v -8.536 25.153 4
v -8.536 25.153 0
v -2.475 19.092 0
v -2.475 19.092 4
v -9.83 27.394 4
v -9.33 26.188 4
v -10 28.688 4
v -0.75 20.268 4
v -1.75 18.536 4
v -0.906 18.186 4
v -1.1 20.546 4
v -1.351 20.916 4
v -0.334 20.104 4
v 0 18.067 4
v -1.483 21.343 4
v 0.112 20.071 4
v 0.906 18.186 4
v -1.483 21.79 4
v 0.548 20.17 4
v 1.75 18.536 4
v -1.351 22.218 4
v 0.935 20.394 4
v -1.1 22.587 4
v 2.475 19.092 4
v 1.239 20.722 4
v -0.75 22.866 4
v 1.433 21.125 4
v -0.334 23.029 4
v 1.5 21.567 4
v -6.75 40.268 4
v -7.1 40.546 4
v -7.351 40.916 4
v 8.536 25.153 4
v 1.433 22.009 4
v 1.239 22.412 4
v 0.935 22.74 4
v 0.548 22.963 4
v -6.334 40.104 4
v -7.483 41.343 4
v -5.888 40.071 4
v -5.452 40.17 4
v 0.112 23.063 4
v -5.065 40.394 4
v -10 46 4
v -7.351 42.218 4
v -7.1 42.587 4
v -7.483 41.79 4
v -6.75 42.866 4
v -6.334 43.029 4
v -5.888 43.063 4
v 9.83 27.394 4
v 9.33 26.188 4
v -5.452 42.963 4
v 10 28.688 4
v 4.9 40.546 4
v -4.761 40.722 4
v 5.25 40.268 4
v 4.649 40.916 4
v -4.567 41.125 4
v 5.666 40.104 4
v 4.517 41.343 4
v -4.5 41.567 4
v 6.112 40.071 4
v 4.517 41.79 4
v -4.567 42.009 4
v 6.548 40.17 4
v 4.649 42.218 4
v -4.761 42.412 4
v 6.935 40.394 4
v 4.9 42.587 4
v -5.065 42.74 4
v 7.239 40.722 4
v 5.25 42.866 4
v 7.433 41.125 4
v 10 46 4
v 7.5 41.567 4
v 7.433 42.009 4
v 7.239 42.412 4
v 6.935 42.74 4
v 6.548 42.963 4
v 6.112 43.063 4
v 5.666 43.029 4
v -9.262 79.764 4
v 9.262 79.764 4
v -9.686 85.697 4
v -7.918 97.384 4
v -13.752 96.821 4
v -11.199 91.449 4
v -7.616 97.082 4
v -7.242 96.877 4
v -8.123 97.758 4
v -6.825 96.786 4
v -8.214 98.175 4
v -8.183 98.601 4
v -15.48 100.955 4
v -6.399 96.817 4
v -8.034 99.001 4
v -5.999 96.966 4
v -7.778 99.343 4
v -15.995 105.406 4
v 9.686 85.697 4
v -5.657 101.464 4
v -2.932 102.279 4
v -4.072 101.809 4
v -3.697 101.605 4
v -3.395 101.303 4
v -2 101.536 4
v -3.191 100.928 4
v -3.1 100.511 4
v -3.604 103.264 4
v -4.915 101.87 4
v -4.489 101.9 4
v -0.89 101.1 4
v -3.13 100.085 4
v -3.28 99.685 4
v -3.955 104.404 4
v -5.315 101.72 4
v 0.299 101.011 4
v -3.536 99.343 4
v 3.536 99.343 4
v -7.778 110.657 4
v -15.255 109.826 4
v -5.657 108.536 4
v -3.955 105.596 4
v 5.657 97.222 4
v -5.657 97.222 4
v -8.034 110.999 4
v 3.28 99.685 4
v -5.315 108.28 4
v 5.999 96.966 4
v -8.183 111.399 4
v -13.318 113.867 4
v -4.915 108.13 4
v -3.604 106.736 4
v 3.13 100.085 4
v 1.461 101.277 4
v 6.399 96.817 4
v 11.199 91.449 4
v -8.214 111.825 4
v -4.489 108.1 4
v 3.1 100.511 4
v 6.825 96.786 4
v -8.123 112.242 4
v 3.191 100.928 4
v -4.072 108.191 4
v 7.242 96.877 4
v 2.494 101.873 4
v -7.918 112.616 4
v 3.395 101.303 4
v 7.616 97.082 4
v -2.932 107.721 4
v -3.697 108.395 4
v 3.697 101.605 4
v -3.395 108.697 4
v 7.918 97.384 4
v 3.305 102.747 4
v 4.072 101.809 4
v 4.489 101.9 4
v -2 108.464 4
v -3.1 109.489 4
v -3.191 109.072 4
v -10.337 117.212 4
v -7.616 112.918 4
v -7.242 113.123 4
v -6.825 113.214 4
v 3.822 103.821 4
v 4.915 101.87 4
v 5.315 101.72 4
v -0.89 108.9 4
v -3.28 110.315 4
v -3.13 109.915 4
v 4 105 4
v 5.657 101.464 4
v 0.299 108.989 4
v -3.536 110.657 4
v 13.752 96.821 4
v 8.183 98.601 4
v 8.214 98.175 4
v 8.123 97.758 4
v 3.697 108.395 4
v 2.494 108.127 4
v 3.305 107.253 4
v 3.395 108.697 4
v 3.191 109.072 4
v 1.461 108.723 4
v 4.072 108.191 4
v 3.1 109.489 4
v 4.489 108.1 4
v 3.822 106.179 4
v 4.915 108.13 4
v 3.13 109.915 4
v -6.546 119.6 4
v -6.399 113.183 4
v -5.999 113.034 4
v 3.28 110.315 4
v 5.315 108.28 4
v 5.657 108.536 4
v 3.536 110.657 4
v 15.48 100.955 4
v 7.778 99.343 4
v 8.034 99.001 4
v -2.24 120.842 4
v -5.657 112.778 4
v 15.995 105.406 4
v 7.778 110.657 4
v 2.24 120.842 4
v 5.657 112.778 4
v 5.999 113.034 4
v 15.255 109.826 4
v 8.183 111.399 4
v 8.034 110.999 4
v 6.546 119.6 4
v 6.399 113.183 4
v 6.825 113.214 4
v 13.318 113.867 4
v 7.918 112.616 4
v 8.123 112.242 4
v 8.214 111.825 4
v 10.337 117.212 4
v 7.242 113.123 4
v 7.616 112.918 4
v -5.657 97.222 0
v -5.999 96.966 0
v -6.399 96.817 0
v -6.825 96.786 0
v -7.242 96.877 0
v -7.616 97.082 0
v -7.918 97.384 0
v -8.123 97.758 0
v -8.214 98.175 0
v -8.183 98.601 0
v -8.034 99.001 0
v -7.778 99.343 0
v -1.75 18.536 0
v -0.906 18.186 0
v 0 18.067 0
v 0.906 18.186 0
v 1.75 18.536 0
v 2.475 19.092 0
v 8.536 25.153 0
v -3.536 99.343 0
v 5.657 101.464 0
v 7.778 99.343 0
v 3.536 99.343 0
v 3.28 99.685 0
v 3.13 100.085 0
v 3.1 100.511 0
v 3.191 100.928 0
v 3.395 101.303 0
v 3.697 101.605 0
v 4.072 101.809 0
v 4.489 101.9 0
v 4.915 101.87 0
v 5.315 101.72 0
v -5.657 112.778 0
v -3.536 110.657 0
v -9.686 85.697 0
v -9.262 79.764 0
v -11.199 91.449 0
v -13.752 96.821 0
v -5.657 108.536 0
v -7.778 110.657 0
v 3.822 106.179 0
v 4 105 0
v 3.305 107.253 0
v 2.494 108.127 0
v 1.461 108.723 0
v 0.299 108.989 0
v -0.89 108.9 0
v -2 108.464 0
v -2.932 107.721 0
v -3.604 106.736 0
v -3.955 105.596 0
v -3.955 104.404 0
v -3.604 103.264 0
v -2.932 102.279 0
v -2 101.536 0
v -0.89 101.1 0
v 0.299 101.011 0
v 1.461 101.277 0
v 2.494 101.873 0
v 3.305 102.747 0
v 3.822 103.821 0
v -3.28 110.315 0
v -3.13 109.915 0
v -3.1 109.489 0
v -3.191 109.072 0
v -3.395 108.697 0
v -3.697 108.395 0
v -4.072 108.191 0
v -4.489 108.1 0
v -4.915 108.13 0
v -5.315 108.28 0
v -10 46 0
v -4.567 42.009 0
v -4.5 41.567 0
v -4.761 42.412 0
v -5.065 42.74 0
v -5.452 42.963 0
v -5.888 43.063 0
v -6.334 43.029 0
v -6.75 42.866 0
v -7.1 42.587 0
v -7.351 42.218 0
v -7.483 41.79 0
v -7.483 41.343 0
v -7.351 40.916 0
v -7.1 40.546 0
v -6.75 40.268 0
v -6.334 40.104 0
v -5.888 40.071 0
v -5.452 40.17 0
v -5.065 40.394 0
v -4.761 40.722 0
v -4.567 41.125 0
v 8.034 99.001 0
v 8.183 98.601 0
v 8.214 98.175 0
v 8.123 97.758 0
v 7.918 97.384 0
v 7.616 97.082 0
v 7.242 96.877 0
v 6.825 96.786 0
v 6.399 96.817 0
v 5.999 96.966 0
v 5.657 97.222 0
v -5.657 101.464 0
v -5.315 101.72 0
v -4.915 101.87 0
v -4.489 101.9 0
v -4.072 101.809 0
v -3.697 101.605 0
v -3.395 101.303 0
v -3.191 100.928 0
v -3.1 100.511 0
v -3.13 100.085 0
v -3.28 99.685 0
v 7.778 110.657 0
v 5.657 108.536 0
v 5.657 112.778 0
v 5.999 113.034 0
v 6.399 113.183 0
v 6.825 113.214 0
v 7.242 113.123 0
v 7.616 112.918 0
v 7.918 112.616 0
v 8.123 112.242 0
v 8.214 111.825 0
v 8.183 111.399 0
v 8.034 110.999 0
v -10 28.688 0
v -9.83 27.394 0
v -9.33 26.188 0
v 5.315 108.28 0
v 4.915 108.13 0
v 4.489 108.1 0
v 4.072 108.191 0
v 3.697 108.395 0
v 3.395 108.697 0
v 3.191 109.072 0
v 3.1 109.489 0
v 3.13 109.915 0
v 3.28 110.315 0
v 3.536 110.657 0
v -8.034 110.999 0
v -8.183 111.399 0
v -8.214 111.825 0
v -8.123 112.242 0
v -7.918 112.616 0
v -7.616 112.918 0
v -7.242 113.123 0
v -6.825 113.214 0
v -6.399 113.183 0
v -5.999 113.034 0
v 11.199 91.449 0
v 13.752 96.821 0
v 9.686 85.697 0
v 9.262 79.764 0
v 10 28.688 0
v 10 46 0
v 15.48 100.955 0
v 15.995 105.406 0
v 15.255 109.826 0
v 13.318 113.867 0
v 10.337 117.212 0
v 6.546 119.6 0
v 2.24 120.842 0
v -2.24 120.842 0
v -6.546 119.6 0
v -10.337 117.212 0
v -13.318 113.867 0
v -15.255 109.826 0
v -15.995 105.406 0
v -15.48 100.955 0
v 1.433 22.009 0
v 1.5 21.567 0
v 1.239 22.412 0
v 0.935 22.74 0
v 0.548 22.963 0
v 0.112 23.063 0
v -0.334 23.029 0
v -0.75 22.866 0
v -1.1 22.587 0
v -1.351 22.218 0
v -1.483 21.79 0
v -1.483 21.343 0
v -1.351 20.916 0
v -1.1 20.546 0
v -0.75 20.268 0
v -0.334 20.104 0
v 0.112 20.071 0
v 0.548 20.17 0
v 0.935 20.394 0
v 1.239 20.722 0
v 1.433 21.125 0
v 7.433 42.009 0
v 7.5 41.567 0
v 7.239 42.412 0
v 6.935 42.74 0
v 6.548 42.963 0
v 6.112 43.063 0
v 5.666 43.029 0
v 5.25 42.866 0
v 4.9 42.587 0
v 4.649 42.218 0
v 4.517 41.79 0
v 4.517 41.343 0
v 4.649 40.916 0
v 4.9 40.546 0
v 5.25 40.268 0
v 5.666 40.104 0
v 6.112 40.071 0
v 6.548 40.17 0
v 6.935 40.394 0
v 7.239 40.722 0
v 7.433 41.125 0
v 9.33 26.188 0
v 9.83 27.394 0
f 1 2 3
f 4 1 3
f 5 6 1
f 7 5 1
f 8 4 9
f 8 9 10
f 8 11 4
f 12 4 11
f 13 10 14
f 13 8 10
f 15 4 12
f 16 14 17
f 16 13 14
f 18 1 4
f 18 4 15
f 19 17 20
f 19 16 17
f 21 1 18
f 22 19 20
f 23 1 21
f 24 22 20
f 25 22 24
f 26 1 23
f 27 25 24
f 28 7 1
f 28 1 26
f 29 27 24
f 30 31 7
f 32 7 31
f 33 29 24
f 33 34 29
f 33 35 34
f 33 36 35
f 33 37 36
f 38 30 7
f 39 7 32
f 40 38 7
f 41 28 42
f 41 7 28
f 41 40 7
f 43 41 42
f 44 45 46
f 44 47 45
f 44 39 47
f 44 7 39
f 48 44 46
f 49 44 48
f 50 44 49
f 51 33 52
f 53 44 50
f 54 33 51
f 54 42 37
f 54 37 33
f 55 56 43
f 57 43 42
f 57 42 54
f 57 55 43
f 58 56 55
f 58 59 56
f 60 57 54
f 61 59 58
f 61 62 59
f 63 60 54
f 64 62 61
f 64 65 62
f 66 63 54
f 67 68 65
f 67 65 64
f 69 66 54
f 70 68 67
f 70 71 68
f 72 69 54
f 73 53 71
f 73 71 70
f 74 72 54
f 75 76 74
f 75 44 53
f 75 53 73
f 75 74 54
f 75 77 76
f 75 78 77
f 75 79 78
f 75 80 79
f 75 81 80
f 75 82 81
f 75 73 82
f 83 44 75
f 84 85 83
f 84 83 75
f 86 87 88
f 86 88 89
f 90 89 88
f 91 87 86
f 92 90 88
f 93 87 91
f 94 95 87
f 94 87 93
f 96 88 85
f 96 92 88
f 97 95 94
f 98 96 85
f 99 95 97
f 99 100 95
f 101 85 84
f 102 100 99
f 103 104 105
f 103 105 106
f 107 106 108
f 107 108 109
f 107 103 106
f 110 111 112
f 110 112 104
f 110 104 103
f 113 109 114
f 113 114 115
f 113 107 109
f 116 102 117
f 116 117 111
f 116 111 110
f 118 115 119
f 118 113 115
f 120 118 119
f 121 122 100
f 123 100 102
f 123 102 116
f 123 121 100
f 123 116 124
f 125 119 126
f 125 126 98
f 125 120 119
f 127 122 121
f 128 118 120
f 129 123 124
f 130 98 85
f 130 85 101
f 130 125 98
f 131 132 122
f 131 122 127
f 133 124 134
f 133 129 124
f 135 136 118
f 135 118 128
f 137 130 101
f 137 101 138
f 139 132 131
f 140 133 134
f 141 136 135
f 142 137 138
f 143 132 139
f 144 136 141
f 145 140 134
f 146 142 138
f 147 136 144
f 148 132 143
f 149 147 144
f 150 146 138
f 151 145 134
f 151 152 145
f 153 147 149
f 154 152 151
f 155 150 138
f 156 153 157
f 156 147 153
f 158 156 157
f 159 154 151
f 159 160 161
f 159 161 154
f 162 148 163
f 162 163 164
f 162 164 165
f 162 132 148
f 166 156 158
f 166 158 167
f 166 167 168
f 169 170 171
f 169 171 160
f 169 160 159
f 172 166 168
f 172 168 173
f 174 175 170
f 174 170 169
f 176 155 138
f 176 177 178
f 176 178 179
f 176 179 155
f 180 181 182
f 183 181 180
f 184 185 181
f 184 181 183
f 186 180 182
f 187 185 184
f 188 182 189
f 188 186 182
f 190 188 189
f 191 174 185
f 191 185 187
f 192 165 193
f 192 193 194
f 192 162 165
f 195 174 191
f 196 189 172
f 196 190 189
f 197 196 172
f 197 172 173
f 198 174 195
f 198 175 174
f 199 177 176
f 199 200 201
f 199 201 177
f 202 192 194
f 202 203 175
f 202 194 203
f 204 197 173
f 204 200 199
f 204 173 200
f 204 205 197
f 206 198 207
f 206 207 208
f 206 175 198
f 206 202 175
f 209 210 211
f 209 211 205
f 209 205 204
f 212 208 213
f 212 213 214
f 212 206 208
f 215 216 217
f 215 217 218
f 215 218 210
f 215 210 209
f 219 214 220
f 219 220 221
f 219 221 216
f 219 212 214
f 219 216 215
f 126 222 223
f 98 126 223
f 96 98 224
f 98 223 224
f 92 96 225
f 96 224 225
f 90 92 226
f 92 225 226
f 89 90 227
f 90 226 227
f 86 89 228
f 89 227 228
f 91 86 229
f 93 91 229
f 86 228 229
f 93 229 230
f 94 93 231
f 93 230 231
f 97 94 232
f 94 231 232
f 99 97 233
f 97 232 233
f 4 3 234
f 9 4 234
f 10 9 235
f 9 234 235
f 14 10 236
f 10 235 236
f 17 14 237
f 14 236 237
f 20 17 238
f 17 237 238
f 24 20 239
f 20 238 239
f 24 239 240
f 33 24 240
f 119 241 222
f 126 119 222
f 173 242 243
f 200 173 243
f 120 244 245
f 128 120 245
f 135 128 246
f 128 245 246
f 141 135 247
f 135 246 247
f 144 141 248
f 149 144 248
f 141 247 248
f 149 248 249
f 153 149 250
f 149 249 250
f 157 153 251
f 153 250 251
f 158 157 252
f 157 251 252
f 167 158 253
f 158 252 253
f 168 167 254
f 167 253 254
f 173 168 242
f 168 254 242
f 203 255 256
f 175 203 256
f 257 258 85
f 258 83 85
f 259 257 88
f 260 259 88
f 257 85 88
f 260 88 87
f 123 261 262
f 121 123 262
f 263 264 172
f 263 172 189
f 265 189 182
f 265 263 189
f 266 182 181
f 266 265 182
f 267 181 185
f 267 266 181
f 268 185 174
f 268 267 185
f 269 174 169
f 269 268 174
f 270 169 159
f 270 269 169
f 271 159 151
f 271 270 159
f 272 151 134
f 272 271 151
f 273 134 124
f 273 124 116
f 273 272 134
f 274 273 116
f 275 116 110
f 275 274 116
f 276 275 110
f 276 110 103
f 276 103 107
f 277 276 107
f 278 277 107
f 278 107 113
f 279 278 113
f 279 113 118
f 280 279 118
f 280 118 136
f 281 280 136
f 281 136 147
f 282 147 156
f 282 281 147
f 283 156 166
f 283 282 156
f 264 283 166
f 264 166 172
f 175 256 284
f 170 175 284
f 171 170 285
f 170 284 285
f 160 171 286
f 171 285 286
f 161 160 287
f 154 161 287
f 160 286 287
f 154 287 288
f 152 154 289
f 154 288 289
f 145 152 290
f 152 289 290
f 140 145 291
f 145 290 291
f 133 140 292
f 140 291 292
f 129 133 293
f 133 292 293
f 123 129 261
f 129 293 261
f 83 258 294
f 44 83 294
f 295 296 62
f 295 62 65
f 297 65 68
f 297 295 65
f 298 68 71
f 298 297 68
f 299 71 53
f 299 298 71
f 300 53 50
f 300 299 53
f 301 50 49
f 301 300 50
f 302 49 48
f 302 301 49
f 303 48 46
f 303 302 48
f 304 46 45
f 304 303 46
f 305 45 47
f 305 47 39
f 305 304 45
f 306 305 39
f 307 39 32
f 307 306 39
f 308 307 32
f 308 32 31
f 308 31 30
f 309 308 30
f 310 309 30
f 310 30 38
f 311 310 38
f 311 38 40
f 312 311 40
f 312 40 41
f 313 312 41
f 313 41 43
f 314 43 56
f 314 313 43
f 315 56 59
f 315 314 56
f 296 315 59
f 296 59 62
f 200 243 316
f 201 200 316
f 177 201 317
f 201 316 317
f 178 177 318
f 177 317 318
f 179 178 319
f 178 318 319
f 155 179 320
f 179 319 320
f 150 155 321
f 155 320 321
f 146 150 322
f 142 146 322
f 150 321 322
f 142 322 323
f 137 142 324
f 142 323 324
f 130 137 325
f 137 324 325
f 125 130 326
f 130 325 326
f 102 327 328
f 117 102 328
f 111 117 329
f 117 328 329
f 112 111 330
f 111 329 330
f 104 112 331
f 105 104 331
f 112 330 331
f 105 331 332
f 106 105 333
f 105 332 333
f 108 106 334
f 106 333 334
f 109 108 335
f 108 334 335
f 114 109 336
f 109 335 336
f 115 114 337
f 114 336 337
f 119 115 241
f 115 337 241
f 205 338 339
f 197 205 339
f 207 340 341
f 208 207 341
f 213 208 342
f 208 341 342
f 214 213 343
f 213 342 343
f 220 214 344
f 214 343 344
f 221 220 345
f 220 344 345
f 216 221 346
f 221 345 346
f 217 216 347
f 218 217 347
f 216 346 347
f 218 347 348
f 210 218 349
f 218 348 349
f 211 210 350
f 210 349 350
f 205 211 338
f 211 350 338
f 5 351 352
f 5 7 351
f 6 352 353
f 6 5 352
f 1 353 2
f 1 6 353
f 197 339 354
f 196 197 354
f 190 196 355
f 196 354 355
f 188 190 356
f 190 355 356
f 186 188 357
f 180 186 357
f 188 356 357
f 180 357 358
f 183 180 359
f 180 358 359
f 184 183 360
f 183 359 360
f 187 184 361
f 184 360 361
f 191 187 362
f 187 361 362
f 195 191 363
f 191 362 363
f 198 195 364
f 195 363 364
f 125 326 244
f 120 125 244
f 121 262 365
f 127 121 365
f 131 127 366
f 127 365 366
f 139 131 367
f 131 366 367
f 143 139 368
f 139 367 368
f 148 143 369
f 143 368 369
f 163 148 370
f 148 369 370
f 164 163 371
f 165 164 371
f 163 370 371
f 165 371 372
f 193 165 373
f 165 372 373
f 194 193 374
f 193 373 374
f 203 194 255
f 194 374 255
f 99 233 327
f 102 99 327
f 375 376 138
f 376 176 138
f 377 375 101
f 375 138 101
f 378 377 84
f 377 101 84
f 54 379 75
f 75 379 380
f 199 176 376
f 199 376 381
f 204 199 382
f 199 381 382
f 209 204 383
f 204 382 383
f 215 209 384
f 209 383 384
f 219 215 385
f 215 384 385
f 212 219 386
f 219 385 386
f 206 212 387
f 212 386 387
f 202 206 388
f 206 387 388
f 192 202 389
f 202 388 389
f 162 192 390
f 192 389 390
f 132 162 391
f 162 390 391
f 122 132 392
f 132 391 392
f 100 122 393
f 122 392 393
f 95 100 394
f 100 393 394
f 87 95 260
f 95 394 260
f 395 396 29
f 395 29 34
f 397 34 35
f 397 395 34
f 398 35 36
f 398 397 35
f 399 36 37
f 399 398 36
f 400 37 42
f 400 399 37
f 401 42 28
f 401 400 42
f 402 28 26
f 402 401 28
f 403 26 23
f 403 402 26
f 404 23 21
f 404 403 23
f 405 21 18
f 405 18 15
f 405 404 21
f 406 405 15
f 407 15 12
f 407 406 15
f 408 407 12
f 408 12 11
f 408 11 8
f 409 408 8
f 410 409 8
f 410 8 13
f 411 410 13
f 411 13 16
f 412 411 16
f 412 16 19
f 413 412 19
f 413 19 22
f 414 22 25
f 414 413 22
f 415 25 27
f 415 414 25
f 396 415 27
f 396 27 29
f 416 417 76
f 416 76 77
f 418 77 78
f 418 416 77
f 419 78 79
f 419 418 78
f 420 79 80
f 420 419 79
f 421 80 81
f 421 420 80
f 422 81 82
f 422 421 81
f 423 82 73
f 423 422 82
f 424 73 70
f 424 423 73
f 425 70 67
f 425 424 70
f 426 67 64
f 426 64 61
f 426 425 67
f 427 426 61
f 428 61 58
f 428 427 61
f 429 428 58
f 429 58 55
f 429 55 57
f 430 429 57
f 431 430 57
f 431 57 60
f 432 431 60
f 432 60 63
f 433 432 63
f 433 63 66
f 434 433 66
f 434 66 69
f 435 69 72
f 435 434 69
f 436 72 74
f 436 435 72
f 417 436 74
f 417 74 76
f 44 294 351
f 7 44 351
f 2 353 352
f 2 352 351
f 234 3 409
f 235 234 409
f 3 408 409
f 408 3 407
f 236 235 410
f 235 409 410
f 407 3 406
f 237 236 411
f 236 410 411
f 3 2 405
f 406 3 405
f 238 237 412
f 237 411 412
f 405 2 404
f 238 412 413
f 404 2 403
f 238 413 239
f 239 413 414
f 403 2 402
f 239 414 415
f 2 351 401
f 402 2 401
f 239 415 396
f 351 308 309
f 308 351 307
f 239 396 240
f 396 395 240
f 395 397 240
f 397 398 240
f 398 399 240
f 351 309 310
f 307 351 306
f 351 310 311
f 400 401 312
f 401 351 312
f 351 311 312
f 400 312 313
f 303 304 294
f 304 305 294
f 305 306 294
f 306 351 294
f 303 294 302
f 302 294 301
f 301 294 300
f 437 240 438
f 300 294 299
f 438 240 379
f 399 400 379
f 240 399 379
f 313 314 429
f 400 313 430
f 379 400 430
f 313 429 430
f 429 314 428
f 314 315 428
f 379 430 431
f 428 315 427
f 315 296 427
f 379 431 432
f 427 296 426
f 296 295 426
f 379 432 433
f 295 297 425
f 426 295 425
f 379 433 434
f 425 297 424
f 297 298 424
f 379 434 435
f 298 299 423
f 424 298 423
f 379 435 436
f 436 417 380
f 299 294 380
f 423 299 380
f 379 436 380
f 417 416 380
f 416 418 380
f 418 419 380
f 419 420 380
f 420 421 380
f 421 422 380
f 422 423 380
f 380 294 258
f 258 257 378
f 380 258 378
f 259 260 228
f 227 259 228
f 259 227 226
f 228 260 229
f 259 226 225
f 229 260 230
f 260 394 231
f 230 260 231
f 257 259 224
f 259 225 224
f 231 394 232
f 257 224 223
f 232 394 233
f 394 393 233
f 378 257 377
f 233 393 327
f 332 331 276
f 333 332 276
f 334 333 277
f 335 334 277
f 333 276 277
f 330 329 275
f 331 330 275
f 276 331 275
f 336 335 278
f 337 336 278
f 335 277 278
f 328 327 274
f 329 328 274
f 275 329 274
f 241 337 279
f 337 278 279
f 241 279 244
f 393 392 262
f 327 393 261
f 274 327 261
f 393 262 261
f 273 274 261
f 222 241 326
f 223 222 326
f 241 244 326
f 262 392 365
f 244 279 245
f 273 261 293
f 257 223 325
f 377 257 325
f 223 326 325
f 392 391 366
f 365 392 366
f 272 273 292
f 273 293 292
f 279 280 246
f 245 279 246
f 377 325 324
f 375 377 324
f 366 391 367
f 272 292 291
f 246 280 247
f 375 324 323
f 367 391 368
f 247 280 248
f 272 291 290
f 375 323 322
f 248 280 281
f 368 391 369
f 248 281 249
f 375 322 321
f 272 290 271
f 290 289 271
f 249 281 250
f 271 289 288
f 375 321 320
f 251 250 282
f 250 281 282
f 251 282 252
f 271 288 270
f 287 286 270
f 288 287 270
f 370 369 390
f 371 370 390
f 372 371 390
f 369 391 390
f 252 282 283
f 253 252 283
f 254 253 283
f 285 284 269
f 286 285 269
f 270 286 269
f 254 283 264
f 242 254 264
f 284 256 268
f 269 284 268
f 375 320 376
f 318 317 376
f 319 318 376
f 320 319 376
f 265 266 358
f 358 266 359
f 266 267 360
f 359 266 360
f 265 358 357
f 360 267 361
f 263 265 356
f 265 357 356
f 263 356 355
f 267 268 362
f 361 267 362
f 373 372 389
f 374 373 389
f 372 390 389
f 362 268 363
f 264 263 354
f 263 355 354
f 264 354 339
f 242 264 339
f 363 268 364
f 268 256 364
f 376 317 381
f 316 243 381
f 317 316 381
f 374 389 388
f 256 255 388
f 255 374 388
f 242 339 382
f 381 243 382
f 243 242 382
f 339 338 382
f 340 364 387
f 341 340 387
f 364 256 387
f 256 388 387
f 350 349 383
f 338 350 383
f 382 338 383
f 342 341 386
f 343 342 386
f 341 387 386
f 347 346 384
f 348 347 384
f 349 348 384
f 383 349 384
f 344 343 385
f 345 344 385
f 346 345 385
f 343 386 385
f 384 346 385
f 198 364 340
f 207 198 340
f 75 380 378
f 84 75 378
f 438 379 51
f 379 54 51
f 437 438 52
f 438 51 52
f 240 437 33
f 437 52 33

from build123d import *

# Parameters (mm, degrees)
F0_R     = 1.5
F0_R_2   = 4
F1_DEPTH = 4
F2_R     = 5
F3_R     = 32


# Not quite as in the source:
# - a feature names something its author has since deleted; it is built from what else it names


with BuildPart() as f1:
    # F0 (on Top) → F1 (new body)
    with BuildSketch(Plane.XY):
        with BuildLine():
            Line((-9, 91.7712434447), (-10, 46))
            Line((-10, 46), (-10, 26.6170093579))
            Line((-10, 26.6170093579), (-2.4748737342, 19.091883092))
            ThreePointArc((-2.4748737342, 19.091883092), (0, 18.0667568262), (2.4748737342, 19.091883092))
            Line((2.4748737342, 19.091883092), (10, 26.6170093579))
            Line((10, 26.6170093579), (10, 46))
            Line((10, 46), (9, 91.7712434447))
            ThreePointArc((9, 91.7712434447), (0, 121), (-9, 91.7712434447))
        make_face()
        with Locations((-6, 41.5667568262)):
            Circle(F0_R, mode=Mode.SUBTRACT)
        with Locations((0, 21.5667568262)):
            Circle(F0_R, mode=Mode.SUBTRACT)
        with Locations((6, 41.5667568262)):
            Circle(F0_R, mode=Mode.SUBTRACT)
        with BuildLine():
            ThreePointArc((-5.6568542495, 101.4644660941), (-3.5355339059, 101.4644660941), (-3.5355339059, 99.3431457505))
            Line((-3.5355339059, 99.3431457505), (-5.6568542495, 97.2218254069))
            ThreePointArc((-5.6568542495, 97.2218254069), (-7.7781745931, 97.2218254069), (-7.7781745931, 99.3431457505))
            Line((-7.7781745931, 99.3431457505), (-5.6568542495, 101.4644660941))
        make_face(mode=Mode.SUBTRACT)
        with BuildLine():
            ThreePointArc((-3.5355339059, 110.6568542495), (-3.5355339059, 108.5355339059), (-5.6568542495, 108.5355339059))
            Line((-5.6568542495, 108.5355339059), (-7.7781745931, 110.6568542495))
            ThreePointArc((-7.7781745931, 110.6568542495), (-7.7781745931, 112.7781745931), (-5.6568542495, 112.7781745931))
            Line((-5.6568542495, 112.7781745931), (-3.5355339059, 110.6568542495))
        make_face(mode=Mode.SUBTRACT)
        with Locations((0, 105)):
            Circle(F0_R_2, mode=Mode.SUBTRACT)
        with BuildLine():
            ThreePointArc((3.5355339059, 99.3431457505), (3.5355339059, 101.4644660941), (5.6568542495, 101.4644660941))
            Line((5.6568542495, 101.4644660941), (7.7781745931, 99.3431457505))
            ThreePointArc((7.7781745931, 99.3431457505), (7.7781745931, 97.2218254069), (5.6568542495, 97.2218254069))
            Line((5.6568542495, 97.2218254069), (3.5355339059, 99.3431457505))
        make_face(mode=Mode.SUBTRACT)
        with BuildLine():
            ThreePointArc((5.6568542495, 108.5355339059), (3.5355339059, 108.5355339059), (3.5355339059, 110.6568542495))
            Line((3.5355339059, 110.6568542495), (5.6568542495, 112.7781745931))
            ThreePointArc((5.6568542495, 112.7781745931), (7.7781745931, 112.7781745931), (7.7781745931, 110.6568542495))
            Line((7.7781745931, 110.6568542495), (5.6568542495, 108.5355339059))
        make_face(mode=Mode.SUBTRACT)
    extrude(amount=F1_DEPTH)

    # F2
    f2_edges = [f1.edges().sort_by_distance(p)[0] for p in [
        (10, 46, 2),
        (-10, 46, 2),
        (-10, 26.617009, 2),
        (10, 26.617009, 2),
    ]]
    fillet(f2_edges, radius=F2_R)

    # F3
    f3_edges = [f1.edges().sort_by_distance(p)[0] for p in [
        (-9, 91.771243, 2),
        (9, 91.771243, 2),
    ]]
    fillet(f3_edges, radius=F3_R)


solid = f1.part
